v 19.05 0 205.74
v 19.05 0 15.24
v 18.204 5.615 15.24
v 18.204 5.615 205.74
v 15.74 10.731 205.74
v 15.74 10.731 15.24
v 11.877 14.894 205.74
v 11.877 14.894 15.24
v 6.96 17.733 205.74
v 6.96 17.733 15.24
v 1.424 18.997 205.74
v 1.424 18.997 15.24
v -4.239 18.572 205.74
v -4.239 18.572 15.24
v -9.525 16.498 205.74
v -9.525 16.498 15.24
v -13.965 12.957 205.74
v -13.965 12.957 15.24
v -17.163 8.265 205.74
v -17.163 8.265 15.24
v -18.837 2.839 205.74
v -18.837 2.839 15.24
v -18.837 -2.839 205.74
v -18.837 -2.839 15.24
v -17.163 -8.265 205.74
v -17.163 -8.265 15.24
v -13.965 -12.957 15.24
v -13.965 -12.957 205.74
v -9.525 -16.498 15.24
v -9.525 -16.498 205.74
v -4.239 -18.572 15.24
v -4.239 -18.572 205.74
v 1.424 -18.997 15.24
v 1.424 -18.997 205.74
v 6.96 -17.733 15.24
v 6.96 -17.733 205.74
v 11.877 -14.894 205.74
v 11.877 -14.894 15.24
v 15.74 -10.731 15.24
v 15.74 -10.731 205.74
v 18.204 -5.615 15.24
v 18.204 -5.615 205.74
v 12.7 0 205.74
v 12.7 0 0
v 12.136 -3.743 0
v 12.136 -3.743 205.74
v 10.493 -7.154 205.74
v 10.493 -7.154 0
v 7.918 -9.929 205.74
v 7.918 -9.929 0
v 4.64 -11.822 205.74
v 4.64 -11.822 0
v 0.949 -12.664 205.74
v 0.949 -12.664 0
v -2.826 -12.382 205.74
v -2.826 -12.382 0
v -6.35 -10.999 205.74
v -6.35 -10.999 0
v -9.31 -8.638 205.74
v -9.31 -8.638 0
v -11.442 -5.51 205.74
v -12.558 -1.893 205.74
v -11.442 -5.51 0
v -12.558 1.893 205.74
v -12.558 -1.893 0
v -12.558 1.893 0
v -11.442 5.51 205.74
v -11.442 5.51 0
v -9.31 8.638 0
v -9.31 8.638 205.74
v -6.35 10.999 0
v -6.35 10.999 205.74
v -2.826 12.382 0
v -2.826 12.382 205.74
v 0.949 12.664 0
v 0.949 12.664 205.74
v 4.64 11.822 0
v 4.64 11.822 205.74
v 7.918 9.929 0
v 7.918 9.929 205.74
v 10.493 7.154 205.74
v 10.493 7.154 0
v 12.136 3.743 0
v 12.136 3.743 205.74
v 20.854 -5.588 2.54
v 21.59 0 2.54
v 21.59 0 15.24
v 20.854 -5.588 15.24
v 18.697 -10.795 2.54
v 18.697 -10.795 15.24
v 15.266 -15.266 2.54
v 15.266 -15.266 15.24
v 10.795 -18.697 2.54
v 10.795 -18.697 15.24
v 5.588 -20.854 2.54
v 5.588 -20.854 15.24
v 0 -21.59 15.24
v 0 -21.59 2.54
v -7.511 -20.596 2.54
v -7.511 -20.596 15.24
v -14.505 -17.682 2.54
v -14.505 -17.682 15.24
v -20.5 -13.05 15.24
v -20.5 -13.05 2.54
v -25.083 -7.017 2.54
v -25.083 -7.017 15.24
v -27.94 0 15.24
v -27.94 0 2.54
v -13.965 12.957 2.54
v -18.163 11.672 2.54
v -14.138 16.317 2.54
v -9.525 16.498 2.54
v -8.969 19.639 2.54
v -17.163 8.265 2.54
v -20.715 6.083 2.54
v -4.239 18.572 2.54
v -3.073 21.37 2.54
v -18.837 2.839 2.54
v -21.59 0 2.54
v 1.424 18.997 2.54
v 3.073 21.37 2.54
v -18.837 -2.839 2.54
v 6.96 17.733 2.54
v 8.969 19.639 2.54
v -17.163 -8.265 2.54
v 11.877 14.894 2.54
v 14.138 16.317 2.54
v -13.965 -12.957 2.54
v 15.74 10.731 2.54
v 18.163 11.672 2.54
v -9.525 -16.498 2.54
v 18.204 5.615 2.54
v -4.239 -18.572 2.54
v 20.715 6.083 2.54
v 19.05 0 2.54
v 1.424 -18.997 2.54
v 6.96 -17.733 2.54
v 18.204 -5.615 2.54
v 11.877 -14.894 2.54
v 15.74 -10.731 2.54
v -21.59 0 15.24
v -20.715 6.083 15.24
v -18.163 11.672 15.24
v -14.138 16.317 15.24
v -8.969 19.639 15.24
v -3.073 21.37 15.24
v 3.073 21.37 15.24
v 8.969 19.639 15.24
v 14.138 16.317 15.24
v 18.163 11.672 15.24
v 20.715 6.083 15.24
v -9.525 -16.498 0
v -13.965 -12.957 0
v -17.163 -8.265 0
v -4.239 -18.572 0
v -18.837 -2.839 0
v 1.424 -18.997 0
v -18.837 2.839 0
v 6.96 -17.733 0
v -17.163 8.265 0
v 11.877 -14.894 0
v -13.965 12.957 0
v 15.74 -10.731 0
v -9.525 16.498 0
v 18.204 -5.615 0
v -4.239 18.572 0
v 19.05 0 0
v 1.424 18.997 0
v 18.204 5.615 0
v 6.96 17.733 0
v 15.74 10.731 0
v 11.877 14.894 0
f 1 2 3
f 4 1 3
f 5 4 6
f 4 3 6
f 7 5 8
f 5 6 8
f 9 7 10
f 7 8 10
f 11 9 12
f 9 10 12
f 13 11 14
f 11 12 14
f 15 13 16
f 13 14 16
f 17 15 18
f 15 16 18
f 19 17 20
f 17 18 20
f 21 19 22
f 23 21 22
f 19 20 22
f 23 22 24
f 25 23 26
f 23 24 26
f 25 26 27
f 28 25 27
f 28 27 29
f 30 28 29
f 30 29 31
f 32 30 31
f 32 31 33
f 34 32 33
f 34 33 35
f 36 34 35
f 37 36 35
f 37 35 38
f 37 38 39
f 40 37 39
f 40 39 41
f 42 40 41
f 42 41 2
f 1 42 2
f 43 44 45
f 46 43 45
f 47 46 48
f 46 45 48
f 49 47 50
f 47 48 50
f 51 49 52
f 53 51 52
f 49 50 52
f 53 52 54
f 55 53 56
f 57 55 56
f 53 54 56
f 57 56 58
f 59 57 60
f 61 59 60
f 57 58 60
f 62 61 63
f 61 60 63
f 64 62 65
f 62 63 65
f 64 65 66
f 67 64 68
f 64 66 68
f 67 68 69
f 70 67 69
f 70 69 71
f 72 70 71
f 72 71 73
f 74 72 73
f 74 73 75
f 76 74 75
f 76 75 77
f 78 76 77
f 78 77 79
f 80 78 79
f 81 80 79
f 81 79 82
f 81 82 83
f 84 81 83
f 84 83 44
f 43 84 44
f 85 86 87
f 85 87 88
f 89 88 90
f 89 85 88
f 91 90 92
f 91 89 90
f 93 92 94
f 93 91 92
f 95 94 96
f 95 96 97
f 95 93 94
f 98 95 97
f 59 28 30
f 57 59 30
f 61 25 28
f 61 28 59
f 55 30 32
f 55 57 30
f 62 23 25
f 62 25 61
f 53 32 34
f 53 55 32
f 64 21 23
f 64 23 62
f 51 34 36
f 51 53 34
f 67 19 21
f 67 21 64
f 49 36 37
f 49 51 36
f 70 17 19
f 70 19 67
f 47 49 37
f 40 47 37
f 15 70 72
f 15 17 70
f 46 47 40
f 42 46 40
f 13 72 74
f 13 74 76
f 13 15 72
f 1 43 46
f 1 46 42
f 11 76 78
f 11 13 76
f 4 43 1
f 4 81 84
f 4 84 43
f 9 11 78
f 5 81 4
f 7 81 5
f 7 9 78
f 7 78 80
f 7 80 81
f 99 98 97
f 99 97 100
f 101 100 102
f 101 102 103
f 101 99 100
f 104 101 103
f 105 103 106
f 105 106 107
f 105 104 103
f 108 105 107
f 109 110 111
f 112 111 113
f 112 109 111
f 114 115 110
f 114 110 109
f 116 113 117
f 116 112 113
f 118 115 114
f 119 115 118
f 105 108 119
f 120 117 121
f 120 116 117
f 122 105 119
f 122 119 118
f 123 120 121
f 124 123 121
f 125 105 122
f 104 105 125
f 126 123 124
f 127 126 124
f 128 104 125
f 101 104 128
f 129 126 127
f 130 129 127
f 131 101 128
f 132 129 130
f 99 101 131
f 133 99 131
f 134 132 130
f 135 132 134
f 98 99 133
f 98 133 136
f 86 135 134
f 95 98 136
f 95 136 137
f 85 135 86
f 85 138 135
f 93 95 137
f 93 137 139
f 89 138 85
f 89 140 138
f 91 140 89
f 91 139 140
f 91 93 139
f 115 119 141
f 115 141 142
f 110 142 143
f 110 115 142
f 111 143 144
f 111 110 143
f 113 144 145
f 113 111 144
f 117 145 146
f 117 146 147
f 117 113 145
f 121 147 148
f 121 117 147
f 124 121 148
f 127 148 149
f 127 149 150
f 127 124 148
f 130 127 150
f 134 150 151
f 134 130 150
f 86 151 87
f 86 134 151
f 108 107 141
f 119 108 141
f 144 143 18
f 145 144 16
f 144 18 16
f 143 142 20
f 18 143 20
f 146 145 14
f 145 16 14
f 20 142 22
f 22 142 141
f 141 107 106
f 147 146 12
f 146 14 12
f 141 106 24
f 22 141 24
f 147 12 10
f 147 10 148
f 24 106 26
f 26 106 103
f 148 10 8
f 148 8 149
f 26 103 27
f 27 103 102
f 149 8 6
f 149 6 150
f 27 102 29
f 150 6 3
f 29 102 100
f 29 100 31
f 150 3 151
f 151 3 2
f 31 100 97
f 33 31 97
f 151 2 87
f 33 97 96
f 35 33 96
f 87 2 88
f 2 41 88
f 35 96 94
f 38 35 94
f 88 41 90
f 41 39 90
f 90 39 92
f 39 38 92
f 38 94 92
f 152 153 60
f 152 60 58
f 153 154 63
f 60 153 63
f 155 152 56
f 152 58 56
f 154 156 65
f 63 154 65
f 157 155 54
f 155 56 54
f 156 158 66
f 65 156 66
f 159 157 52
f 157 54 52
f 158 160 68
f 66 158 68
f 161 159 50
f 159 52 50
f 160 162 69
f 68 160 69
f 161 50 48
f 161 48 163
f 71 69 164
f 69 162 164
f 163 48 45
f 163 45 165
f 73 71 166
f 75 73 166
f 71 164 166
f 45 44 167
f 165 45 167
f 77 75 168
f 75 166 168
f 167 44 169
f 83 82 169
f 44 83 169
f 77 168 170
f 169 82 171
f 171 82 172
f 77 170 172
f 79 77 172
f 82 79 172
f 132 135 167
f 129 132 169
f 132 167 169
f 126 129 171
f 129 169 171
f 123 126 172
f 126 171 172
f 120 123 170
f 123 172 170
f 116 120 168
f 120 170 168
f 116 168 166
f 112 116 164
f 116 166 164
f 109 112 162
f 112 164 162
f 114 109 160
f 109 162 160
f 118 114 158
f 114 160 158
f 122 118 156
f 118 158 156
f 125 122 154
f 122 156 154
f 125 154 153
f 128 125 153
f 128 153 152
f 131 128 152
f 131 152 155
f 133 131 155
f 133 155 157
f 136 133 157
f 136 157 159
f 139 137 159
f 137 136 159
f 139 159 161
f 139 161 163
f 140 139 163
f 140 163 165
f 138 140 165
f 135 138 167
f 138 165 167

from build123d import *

# Parameters (mm, degrees)
F0_R      = 19.05
F1_DEPTH  = 205.74
F9_R      = 19.05
F10_DEPTH = 12.7
F11_R     = 12.7
F12_DEPTH = 254


with BuildPart() as f1:
    # F0 (on Top) → F1 (new body)
    with BuildSketch(Plane.XY):
        Circle(F0_R)
    extrude(amount=F1_DEPTH)

    # F9 (on offset) → F10 (join)
    with BuildSketch(Plane(origin=(0, 0, 2.54), x_dir=(1, 0, 0), z_dir=(0, 0, -1))):
        with BuildLine():
            ThreePointArc((-21.59, 0), (0, -21.59), (21.59, 0))
            ThreePointArc((21.59, 0), (15.266435, 15.266435), (0, 21.59))
            ThreePointArc((0, 21.59), (-15.266435, 15.266435), (-21.59, 0))
        make_face()
        Circle(F9_R, mode=Mode.SUBTRACT)
        with BuildLine():
            ThreePointArc((-21.59, 0), (-15.266435, 15.266435), (0, 21.59))
            ThreePointArc((0, 21.59), (-17.654827, 15.5636), (-27.94, 0))
            Line((-27.94, 0), (-21.59, 0))
        make_face()
    extrude(amount=-F10_DEPTH)

    # F11 (on face) → F12 (cut)
    with BuildSketch(Plane(origin=(0, 0, 0), x_dir=(1, 0, 0), z_dir=(0, 0, -1))):
        Circle(F11_R)
    extrude(amount=-F12_DEPTH, mode=Mode.SUBTRACT)


solid = f1.part
